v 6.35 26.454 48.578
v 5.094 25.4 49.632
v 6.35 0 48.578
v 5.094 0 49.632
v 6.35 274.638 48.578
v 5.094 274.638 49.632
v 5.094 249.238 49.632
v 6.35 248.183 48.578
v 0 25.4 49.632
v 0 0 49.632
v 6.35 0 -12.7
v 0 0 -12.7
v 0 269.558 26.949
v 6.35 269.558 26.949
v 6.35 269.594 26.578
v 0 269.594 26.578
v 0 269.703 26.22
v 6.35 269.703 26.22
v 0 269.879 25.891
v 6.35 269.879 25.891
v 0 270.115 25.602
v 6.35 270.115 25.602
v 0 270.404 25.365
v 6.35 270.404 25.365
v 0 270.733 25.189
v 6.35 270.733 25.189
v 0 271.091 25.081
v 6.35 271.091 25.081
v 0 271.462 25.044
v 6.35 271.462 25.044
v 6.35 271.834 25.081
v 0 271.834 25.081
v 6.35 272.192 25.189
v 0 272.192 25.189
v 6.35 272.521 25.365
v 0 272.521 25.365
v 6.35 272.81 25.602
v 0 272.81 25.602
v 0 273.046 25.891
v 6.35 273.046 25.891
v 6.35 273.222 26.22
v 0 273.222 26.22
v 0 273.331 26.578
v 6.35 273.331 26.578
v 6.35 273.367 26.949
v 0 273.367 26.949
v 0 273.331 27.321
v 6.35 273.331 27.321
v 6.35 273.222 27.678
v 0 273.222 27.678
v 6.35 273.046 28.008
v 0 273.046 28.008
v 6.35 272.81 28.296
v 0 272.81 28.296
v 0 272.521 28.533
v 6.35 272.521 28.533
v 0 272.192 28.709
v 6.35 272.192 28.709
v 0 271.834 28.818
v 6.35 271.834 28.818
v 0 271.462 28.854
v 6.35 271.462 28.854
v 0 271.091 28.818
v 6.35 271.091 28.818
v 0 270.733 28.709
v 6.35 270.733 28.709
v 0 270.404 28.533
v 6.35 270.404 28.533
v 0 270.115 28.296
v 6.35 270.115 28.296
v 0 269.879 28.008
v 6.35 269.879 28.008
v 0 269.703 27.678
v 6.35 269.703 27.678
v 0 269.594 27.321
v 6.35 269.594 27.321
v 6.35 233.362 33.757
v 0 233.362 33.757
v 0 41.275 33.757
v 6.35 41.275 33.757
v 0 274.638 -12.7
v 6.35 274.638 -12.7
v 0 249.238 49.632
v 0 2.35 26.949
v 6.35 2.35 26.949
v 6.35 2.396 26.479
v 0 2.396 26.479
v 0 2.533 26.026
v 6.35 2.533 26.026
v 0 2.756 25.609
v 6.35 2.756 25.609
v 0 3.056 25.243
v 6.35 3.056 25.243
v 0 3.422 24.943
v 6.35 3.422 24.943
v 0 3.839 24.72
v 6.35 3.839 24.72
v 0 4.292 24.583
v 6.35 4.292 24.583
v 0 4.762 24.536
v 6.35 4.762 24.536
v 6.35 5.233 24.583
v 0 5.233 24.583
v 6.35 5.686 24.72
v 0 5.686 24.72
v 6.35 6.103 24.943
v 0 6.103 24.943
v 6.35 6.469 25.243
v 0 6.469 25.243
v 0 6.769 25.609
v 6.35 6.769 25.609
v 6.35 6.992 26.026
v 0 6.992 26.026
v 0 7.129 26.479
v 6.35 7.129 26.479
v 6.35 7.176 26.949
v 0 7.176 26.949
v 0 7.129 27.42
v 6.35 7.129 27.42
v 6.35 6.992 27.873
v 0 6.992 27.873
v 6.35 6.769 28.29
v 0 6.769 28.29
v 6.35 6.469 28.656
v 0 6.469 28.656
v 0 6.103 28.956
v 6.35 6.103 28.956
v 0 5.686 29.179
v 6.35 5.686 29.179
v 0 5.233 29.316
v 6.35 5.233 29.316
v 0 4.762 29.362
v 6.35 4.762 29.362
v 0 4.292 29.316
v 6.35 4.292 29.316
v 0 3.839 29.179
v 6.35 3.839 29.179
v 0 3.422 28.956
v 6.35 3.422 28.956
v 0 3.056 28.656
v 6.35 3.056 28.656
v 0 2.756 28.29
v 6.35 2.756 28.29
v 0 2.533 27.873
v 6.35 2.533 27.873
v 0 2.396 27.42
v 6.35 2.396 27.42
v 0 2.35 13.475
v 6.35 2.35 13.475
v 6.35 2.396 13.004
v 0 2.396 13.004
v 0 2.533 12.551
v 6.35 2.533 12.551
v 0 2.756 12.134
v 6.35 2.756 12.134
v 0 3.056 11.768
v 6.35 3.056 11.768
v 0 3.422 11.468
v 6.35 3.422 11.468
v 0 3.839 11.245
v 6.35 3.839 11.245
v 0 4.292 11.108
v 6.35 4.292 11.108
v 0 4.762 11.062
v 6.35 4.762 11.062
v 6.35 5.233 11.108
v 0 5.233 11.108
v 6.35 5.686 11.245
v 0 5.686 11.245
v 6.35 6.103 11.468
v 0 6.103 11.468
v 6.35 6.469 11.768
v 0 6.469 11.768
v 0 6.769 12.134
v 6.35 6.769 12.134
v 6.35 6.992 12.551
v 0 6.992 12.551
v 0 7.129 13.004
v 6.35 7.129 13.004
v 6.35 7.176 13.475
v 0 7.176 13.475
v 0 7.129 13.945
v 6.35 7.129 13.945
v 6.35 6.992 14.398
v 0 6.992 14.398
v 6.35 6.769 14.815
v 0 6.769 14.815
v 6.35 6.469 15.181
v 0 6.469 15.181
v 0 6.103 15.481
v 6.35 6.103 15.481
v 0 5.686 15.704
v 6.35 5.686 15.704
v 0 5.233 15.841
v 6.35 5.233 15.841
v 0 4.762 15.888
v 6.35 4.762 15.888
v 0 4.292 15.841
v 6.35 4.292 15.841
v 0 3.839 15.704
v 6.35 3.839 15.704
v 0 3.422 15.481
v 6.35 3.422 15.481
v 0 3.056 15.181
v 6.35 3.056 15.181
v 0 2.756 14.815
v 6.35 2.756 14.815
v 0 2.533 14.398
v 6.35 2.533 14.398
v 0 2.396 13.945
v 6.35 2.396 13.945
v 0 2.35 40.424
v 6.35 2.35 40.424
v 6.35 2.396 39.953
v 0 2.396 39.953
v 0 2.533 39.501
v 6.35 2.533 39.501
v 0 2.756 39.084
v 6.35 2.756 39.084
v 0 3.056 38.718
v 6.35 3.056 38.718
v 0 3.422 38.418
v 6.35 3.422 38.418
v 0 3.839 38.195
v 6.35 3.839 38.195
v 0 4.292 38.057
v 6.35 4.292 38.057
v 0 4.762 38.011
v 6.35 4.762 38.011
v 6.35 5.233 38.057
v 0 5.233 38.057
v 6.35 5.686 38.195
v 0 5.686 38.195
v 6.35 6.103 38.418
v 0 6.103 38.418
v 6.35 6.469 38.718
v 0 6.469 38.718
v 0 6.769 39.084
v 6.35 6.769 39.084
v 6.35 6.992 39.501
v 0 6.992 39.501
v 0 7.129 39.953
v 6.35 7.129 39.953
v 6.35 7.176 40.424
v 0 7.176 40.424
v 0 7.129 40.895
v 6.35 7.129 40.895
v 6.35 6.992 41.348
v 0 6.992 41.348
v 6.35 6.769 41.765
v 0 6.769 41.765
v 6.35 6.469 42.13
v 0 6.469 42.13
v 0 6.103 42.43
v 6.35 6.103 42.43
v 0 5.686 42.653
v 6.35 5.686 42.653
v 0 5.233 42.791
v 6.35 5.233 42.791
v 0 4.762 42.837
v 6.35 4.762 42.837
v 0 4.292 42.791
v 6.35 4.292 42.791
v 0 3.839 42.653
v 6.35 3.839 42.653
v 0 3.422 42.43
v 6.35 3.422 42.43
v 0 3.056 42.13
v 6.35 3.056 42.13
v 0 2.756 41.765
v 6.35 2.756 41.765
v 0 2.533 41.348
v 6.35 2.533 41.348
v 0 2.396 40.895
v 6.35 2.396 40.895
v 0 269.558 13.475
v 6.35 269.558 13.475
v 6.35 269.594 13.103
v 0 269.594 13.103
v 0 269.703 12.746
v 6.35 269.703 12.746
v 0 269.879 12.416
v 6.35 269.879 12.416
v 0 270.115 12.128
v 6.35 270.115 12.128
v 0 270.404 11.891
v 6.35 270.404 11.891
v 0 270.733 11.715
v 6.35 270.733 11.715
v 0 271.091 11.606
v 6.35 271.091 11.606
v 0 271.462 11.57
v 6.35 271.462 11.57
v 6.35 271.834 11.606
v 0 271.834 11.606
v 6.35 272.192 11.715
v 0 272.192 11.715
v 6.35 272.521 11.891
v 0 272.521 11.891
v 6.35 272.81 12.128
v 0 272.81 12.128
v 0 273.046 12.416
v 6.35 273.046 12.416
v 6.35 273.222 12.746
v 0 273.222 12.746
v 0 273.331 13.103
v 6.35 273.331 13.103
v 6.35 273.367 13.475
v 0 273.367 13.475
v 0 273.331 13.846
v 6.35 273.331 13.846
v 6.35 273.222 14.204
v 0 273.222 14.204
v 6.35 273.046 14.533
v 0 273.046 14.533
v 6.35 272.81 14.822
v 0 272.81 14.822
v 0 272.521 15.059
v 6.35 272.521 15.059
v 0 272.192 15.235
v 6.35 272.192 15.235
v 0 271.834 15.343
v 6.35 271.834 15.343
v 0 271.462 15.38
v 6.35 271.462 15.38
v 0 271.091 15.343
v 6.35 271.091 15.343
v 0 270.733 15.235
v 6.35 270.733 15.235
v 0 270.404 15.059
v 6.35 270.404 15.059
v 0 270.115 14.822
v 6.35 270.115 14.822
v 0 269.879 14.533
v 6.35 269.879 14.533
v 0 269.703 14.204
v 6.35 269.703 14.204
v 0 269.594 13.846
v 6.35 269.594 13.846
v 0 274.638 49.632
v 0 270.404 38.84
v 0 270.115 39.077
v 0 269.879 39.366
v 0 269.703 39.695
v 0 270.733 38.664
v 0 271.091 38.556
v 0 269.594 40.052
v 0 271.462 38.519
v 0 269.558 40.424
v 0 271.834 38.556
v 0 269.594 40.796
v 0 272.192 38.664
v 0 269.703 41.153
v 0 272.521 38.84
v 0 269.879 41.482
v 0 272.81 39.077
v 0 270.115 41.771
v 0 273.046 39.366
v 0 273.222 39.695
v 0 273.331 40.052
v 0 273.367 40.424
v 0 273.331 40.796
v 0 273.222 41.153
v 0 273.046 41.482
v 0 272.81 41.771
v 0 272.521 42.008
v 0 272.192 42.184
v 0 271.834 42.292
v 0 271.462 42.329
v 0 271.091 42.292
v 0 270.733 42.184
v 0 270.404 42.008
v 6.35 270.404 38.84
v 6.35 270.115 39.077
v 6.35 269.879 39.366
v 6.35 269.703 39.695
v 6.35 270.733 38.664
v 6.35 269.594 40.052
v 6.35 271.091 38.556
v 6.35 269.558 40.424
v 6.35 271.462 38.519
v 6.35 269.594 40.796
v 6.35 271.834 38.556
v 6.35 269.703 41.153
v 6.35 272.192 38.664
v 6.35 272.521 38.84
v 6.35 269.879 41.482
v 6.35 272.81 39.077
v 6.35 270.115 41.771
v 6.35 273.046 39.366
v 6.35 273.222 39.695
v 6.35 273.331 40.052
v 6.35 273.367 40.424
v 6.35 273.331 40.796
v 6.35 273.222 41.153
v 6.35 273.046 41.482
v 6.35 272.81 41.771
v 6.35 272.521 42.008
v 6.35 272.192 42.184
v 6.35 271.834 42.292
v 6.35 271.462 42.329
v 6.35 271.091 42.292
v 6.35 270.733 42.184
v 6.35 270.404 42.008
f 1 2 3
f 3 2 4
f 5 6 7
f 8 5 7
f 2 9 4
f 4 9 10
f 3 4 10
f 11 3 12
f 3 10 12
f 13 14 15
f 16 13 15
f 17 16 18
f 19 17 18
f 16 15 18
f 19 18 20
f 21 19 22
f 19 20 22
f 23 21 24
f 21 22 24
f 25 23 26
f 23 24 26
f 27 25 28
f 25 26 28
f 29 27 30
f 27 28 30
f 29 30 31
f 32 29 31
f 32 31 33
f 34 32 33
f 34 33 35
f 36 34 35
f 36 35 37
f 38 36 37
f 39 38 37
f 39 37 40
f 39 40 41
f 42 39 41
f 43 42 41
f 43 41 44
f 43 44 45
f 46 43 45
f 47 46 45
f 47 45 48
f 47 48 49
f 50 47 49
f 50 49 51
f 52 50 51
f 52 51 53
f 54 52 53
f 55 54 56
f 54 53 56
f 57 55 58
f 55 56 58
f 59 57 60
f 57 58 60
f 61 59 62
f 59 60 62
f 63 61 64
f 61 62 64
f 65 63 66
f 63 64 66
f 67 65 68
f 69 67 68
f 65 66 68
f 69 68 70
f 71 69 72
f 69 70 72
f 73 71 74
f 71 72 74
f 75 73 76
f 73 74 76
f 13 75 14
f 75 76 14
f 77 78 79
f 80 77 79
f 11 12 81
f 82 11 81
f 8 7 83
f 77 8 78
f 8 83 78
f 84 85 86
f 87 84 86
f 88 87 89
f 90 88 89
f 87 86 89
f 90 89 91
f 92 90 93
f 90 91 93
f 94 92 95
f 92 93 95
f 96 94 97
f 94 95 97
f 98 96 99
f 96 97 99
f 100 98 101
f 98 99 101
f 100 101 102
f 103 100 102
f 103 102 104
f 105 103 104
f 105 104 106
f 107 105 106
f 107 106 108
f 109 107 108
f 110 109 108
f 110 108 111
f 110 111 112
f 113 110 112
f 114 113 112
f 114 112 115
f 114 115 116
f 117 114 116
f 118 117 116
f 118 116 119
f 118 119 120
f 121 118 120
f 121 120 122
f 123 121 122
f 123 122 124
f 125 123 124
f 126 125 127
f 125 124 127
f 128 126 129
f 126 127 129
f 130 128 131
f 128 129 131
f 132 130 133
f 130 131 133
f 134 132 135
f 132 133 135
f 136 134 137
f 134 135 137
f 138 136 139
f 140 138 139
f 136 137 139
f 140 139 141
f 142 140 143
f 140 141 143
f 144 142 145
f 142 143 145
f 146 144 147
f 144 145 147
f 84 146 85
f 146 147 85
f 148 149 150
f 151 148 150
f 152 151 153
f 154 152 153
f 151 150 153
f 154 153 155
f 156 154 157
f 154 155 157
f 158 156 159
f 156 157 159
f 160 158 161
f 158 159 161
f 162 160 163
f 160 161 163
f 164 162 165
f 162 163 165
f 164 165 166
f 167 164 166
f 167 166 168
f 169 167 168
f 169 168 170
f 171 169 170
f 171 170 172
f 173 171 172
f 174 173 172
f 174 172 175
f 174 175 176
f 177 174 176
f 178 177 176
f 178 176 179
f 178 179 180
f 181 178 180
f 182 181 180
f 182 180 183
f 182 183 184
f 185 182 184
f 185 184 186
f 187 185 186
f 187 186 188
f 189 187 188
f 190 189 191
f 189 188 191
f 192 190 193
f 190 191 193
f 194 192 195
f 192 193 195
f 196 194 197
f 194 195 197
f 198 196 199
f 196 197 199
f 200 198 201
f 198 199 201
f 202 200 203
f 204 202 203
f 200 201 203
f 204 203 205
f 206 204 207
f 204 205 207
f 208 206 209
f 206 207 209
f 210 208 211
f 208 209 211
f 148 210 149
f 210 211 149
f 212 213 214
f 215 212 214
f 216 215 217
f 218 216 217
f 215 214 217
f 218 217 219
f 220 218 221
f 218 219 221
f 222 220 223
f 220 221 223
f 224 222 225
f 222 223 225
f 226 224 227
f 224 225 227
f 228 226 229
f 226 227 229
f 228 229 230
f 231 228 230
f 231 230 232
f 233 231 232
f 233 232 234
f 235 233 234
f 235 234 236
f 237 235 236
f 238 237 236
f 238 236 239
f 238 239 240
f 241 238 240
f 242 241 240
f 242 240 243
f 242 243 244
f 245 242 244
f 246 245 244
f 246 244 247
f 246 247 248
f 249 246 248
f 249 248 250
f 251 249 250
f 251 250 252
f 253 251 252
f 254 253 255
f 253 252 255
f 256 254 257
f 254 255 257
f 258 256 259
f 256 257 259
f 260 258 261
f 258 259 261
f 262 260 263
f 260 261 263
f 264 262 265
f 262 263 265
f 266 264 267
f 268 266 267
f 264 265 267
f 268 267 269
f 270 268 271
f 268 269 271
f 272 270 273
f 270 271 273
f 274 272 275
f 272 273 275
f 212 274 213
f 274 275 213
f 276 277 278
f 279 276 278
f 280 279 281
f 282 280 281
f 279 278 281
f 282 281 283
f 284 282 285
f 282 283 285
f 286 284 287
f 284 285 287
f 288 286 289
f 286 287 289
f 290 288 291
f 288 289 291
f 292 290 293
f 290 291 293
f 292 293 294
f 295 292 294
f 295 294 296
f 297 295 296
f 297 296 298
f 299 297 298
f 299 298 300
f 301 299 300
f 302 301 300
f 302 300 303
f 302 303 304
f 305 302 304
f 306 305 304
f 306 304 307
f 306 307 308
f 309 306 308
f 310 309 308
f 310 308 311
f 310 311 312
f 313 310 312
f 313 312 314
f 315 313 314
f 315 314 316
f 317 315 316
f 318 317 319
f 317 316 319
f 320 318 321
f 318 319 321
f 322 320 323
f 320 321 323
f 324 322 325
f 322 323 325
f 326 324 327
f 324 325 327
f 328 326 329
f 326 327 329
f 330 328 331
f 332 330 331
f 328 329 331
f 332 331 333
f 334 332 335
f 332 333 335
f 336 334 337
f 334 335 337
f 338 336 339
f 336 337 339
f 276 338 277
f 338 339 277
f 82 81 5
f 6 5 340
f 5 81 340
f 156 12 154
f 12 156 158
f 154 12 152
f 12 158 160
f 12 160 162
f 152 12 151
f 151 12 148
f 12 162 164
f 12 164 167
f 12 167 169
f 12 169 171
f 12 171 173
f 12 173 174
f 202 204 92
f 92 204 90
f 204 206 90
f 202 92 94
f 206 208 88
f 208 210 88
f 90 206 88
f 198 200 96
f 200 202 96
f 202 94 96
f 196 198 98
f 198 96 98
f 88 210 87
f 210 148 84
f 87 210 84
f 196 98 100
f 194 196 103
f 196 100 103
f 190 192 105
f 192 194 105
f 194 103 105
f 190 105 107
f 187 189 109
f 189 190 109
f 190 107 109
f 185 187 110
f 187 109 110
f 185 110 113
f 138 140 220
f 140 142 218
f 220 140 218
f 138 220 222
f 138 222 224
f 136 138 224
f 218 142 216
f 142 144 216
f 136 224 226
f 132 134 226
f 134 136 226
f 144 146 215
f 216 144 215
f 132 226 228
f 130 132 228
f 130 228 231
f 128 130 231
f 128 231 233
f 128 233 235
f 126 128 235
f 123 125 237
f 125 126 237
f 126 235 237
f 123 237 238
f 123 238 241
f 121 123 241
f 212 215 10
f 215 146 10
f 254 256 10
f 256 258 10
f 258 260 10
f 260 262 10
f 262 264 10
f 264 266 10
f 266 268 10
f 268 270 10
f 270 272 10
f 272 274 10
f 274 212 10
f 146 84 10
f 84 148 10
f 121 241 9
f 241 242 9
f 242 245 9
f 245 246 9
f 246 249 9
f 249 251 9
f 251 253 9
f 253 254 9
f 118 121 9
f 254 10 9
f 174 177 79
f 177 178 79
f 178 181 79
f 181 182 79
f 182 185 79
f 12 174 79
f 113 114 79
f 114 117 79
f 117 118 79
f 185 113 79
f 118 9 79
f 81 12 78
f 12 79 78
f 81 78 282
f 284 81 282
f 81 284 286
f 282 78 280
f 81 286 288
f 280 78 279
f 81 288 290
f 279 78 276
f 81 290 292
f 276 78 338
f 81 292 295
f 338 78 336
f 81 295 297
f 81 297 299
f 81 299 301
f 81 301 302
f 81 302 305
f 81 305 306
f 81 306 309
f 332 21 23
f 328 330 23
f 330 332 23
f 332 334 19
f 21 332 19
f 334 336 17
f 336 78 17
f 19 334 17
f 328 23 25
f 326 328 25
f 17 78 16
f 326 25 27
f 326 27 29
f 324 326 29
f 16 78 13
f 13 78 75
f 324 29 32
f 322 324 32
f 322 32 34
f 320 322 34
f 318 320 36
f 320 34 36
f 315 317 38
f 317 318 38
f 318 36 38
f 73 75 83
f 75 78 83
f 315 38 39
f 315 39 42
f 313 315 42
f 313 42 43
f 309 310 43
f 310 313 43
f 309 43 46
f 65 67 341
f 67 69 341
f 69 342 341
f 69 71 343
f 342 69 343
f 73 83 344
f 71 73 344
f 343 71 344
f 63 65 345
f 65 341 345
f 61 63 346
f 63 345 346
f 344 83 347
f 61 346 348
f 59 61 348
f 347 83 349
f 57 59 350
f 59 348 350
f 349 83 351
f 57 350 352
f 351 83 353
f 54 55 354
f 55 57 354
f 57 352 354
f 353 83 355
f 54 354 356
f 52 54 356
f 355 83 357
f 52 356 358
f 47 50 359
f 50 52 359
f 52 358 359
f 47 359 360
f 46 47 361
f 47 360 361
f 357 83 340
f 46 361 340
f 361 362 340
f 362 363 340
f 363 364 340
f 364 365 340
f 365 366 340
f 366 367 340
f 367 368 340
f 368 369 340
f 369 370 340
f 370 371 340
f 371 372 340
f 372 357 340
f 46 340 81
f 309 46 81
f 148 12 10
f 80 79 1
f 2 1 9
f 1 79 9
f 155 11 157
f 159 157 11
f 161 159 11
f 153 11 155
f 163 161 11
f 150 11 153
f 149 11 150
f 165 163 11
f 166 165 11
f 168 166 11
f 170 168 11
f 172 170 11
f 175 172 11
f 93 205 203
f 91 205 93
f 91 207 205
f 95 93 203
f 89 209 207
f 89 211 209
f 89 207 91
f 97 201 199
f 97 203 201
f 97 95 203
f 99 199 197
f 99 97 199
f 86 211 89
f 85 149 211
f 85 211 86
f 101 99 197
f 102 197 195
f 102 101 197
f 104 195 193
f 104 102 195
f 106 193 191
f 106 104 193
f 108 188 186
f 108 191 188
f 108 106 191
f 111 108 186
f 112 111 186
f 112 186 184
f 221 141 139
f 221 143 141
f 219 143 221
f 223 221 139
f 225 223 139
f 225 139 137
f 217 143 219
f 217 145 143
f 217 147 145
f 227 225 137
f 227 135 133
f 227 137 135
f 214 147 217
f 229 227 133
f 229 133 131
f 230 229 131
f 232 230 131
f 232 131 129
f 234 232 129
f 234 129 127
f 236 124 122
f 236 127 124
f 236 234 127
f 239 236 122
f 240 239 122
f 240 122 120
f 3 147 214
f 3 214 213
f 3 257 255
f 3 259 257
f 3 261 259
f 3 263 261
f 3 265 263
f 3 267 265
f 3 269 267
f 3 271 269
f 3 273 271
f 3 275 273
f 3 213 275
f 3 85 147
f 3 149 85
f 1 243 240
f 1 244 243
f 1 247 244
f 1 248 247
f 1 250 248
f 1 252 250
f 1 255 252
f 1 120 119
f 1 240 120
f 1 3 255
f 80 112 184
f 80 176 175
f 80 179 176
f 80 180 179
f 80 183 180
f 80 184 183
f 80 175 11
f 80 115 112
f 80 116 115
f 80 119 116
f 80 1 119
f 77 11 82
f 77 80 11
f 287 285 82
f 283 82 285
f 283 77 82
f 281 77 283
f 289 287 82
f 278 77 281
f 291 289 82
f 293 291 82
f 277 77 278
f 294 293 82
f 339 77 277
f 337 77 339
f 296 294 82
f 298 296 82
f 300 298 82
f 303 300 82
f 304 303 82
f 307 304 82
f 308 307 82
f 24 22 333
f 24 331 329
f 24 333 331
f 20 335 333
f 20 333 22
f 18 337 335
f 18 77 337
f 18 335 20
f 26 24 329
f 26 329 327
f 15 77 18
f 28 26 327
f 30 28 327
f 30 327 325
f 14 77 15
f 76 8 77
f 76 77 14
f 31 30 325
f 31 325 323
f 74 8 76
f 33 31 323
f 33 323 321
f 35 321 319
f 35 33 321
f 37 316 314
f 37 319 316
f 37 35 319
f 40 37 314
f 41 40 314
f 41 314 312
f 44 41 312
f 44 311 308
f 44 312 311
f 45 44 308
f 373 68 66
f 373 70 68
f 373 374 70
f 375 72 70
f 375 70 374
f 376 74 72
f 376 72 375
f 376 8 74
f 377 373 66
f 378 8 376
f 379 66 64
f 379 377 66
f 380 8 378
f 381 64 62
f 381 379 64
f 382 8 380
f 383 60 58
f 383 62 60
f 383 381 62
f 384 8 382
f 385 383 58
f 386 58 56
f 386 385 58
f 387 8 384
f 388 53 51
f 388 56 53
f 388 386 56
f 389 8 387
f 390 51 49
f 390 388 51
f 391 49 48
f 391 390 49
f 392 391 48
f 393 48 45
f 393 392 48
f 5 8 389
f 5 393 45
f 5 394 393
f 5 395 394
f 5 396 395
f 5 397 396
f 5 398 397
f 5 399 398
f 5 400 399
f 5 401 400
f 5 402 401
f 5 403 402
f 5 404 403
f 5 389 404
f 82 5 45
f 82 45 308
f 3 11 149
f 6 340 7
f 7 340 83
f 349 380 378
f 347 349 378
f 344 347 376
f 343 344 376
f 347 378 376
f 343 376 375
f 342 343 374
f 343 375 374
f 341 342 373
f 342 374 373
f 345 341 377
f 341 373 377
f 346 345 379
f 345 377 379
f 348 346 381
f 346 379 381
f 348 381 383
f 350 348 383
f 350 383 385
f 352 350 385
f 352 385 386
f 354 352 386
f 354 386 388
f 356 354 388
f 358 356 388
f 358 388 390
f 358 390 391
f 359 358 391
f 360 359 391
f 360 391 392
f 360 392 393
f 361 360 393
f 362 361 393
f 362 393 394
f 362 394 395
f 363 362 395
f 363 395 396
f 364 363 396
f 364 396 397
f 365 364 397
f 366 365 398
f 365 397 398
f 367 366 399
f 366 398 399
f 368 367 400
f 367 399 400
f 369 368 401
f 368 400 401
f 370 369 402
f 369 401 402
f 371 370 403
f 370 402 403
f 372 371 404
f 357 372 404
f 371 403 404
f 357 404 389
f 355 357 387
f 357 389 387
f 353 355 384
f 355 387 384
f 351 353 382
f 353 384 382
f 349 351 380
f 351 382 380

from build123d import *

# Parameters (mm, degrees)
F1_DEPTH = 6.35
F2_D     = 4.826
F3_D     = 3.81
F4_SIZE2 = 6.3416783923
F4_SIZE  = 5.3213
F6_DEPTH = 25.4


# Not quite as in the source:
# - a feature names something its author has since deleted; it is built from what else it names


with BuildPart() as f1:
    # F0 (on Right) → F1 (new body)
    with BuildSketch(Plane.YZ):
        Polygon((274.6375, -12.7), (274.6375, 0), (274.6375, 53.8988), (0, 53.8988), (0, 0), (0, -12.7), align=None)
    extrude(amount=F1_DEPTH)

    # F2 (through all)
    with Locations(Plane(origin=(0, 0, 0), x_dir=(0, 1, 0), z_dir=(-1, 0, 0))):
        with Locations((4.7625, -40.4241), (4.7625, -26.9494), (4.7625, -13.4747)):
            Hole(F2_D / 2)

    # F3 (through all)
    with Locations(Plane(origin=(0, 0, 0), x_dir=(0, 1, 0), z_dir=(-1, 0, 0))):
        with Locations((271.4625, -40.4241), (271.4625, -26.9494), (271.4625, -13.4747)):
            Hole(F3_D / 2)

    # F4
    f4_edges = [f1.edges().sort_by_distance(p)[0] for p in [
        (6.35, 137.31875, 53.8988),
    ]]
    f4_side = f1.faces().sort_by_distance((6.35, 137.466328, 20.568323))[0]
    chamfer(f4_edges, length=F4_SIZE, length2=F4_SIZE2, reference=f4_side)

    # F5 (on face) → F6 (cut)
    with BuildSketch(Plane(origin=(0, 0, 0), x_dir=(0, -1, 0), z_dir=(-1, 0, 0))):
        Polygon((-274.6375, 53.8988), (-274.6375, 49.6316), (-249.2375, 49.6316), (-233.3625, 33.7566), (-41.275, 33.7566), (-25.4, 49.6316), (0, 49.6316), (0, 53.8988), align=None)
    extrude(amount=-F6_DEPTH, mode=Mode.SUBTRACT)


solid = f1.part
